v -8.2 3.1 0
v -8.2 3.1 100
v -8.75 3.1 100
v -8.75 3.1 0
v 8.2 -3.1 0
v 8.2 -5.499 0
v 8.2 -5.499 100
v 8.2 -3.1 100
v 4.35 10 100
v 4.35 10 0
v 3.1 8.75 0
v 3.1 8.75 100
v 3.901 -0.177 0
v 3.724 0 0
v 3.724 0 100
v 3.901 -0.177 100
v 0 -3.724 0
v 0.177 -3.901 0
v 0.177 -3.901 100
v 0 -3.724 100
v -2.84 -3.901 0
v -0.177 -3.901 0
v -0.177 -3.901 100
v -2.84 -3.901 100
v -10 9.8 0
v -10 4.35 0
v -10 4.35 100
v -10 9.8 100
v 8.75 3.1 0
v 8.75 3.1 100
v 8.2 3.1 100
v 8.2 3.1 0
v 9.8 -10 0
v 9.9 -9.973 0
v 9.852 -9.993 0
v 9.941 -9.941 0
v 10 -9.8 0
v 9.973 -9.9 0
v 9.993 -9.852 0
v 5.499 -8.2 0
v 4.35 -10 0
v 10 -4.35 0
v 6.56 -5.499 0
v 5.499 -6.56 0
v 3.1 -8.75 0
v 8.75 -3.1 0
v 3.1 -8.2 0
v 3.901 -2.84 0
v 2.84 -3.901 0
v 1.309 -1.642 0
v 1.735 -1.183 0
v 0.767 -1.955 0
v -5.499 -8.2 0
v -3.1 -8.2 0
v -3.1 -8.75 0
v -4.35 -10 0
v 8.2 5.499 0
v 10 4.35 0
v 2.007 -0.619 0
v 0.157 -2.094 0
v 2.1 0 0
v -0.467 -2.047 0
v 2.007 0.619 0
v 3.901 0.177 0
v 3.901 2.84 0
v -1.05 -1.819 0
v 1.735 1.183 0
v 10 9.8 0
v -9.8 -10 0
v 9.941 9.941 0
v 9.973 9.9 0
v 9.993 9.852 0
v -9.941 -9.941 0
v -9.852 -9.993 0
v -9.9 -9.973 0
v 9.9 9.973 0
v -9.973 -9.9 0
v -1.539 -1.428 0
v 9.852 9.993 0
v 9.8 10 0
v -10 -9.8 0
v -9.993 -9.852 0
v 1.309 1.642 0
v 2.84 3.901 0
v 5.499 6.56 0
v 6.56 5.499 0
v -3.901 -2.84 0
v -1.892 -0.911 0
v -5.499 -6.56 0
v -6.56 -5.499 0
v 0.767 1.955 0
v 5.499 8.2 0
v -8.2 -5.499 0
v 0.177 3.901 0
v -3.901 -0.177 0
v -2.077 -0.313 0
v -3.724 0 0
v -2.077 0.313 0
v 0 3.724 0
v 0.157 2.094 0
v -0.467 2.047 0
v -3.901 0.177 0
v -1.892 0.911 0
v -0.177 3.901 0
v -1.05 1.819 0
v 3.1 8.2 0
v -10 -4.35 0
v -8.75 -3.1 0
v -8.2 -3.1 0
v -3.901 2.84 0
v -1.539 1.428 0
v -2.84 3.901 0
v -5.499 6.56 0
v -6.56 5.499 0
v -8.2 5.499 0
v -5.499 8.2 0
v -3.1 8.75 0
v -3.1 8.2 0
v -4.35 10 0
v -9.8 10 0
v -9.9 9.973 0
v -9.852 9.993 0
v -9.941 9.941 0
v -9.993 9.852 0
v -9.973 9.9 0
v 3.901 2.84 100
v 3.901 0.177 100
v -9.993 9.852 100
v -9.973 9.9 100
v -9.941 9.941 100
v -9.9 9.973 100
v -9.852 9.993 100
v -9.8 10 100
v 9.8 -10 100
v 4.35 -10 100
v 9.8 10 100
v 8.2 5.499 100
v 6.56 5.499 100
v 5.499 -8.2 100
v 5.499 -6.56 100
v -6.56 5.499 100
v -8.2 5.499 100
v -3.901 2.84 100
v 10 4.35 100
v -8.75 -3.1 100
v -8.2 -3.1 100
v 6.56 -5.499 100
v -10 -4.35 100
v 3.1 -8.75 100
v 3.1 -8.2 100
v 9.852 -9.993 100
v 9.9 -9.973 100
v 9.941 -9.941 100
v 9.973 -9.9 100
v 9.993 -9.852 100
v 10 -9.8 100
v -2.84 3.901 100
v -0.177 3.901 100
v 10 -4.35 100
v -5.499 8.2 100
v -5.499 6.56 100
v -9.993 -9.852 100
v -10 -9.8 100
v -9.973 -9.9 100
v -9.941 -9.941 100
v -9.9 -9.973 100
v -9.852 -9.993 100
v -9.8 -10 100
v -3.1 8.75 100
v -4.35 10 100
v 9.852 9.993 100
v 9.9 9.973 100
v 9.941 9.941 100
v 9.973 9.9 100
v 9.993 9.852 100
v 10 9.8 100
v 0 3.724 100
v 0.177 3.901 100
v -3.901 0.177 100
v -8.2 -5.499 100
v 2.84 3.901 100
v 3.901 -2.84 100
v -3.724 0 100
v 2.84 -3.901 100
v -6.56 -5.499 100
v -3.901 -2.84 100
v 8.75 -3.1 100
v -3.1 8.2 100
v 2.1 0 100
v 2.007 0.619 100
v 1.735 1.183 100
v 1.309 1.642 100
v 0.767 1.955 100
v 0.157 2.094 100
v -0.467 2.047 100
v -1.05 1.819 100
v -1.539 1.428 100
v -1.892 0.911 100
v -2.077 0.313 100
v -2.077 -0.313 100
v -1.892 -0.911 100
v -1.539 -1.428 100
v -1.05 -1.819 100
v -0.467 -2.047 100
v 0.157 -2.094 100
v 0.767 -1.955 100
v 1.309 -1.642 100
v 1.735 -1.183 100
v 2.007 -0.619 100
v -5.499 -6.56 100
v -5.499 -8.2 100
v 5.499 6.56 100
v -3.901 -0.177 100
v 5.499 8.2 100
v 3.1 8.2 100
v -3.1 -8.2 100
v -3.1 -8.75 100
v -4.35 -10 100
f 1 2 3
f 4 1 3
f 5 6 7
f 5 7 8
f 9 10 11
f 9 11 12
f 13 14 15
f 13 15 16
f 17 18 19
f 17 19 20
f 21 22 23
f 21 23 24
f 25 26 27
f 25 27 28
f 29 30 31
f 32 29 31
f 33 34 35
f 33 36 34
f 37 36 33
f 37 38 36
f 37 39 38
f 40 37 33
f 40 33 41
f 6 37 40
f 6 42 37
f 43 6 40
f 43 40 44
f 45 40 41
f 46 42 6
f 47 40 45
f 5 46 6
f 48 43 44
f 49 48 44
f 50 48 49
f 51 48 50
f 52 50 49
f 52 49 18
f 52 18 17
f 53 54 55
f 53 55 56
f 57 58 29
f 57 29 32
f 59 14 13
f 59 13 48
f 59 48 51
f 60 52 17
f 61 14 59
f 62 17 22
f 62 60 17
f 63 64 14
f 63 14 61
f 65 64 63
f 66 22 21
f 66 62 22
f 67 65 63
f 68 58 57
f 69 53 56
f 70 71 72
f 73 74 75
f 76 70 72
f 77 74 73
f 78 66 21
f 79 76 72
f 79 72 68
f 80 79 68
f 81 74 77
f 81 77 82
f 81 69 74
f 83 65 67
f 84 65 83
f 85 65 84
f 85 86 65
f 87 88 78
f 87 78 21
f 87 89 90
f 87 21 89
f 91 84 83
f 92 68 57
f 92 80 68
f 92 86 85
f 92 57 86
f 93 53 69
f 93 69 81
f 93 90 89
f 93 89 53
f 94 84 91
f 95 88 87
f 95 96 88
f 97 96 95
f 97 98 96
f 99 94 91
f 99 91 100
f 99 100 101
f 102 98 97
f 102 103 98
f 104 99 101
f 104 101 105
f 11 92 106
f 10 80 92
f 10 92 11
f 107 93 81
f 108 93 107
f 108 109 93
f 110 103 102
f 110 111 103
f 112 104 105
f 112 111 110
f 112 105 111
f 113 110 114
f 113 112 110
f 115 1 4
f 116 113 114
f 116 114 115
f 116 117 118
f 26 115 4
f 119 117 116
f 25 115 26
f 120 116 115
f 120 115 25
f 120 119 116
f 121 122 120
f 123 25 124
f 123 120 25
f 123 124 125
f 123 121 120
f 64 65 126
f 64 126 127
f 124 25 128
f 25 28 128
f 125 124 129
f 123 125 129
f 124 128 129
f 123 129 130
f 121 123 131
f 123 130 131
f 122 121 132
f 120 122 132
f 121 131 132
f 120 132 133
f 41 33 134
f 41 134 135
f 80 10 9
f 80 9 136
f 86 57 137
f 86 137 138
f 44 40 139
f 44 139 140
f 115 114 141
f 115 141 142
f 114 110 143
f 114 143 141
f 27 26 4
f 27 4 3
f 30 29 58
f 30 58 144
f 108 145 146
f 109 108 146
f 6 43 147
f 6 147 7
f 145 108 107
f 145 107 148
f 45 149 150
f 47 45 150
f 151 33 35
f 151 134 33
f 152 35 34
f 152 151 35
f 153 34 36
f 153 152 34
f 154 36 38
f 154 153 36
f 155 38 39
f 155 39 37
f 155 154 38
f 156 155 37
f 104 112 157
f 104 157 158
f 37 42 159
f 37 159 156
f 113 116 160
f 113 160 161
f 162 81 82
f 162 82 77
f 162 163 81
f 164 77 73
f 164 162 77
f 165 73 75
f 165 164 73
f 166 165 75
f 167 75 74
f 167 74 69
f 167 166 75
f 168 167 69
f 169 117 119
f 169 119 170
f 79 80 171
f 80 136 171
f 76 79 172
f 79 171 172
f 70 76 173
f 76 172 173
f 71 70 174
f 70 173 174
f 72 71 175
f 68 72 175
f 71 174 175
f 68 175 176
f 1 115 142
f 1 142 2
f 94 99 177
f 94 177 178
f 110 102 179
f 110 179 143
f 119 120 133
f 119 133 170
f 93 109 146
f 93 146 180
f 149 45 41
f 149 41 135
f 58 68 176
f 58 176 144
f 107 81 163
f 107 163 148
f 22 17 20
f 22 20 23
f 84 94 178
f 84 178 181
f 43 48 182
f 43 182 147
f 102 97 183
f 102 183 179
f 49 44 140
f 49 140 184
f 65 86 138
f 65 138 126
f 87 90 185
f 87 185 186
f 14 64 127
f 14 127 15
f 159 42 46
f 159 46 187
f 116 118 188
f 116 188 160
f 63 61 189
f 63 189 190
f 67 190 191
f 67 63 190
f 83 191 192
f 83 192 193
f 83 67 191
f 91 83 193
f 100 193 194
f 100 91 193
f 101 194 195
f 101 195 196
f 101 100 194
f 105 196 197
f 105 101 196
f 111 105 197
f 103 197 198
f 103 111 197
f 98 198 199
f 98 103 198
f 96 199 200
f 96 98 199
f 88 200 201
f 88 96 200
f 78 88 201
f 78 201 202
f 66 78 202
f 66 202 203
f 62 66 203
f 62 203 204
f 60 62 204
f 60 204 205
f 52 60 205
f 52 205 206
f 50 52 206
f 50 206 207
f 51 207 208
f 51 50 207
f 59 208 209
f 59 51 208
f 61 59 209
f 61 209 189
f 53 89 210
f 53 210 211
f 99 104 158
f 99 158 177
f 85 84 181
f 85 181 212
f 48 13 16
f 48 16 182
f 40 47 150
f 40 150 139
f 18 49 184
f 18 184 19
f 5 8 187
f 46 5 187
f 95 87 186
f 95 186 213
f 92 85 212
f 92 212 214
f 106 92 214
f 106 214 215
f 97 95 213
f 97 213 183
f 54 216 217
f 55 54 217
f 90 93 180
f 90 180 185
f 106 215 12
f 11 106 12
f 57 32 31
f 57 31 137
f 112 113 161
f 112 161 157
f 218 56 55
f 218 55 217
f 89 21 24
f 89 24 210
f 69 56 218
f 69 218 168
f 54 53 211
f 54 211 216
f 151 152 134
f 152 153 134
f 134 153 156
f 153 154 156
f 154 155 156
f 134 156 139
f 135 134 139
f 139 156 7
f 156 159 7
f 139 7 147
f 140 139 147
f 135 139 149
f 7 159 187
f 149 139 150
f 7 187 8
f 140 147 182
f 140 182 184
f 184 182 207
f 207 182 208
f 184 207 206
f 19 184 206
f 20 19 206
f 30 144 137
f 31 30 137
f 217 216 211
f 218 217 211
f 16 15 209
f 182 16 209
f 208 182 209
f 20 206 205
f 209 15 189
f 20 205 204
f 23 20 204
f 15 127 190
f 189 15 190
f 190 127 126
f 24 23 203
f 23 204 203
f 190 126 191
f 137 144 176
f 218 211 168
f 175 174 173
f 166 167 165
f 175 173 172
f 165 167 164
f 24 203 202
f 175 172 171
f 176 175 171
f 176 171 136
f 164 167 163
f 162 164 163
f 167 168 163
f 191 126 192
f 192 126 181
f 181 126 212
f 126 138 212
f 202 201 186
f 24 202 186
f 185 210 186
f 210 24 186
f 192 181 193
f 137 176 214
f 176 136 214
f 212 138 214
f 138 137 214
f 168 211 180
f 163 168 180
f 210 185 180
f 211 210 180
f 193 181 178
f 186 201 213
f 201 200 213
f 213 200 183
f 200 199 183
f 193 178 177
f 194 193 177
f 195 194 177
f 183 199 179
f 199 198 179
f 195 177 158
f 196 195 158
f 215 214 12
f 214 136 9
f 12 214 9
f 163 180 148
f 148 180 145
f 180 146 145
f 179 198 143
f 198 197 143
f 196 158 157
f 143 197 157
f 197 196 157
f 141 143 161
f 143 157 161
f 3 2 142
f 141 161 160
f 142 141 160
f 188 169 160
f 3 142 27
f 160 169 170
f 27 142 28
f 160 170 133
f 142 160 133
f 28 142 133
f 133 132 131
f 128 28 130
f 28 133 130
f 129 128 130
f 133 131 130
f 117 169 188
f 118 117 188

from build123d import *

# Parameters (mm, degrees)
SKETCH_R        = 2.1
PAD_DEPTH       = 100
CHAMFER_1_ANGLE = 45
CHAMFER_1_SIZE  = 1.25
CHAMFER_2_ANGLE = 45
CHAMFER_2_SIZE  = 1.25
CHAMFER_3_ANGLE = 45
CHAMFER_3_SIZE  = 1.25
CHAMFER_4_ANGLE = 45
CHAMFER_4_SIZE  = 1.25
CHAMFER_5_ANGLE = 45
CHAMFER_5_SIZE  = 1.25
CHAMFER_6_ANGLE = 45
CHAMFER_6_SIZE  = 1.25
CHAMFER_7_ANGLE = 45
CHAMFER_7_SIZE  = 1.25
CHAMFER_8_ANGLE = 45
CHAMFER_8_SIZE  = 1.25
FILLET_R        = 0.2


with BuildPart() as part:
    # Sketch → Pad (new body)
    with BuildSketch(Plane.XY):
        Polygon((0, 3.723883), (0.176777, 3.90066), (2.84, 3.90066), (5.49934, 6.56), (5.49934, 8.2), (3.1, 8.2), (3.1, 10), (10, 10), (10, 3.1), (8.2, 3.1), (8.2, 5.49934), (6.56, 5.49934), (3.90066, 2.84), (3.90066, 0.176777), (3.723883, 0), (3.90066, -0.176777), (3.90066, -2.84), (6.56, -5.49934), (8.2, -5.49934), (8.2, -3.1), (10, -3.1), (10, -10), (3.1, -10), (3.1, -8.2), (5.49934, -8.2), (5.49934, -6.56), (2.84, -3.90066), (0.176777, -3.90066), (0, -3.723883), (-0.176777, -3.90066), (-2.84, -3.90066), (-5.49934, -6.56), (-5.49934, -8.2), (-3.1, -8.2), (-3.1, -10), (-10, -10), (-10, -3.1), (-8.2, -3.1), (-8.2, -5.49934), (-6.56, -5.49934), (-3.90066, -2.84), (-3.90066, -0.176777), (-3.723883, 0), (-3.90066, 0.176777), (-3.90066, 2.84), (-6.56, 5.49934), (-8.2, 5.49934), (-8.2, 3.1), (-10, 3.1), (-10, 10), (-3.1, 10), (-3.1, 8.2), (-5.49934, 8.2), (-5.49934, 6.56), (-2.84, 3.90066), (-0.176777, 3.90066), align=None)
        Circle(SKETCH_R, mode=Mode.SUBTRACT)
    extrude(amount=PAD_DEPTH)

    # Chamfer 1
    chamfer_1_edges = [part.edges().sort_by_distance(p)[0] for p in [
        (-3.1, 10, 50),
    ]]
    chamfer_1_side = part.faces().sort_by_distance((-6.55, 10, 50))[0]
    chamfer(chamfer_1_edges, length=CHAMFER_1_SIZE, angle=CHAMFER_1_ANGLE, reference=chamfer_1_side)

    # Chamfer 2
    chamfer_2_edges = [part.edges().sort_by_distance(p)[0] for p in [
        (3.1, 10, 50),
    ]]
    chamfer_2_side = part.faces().sort_by_distance((3.1, 9.1, 50))[0]
    chamfer(chamfer_2_edges, length=CHAMFER_2_SIZE, angle=CHAMFER_2_ANGLE, reference=chamfer_2_side)

    # Chamfer 3
    chamfer_3_edges = [part.edges().sort_by_distance(p)[0] for p in [
        (-10, 3.1, 50),
    ]]
    chamfer_3_side = part.faces().sort_by_distance((-9.1, 3.1, 50))[0]
    chamfer(chamfer_3_edges, length=CHAMFER_3_SIZE, angle=CHAMFER_3_ANGLE, reference=chamfer_3_side)

    # Chamfer 4
    chamfer_4_edges = [part.edges().sort_by_distance(p)[0] for p in [
        (3.1, -10, 50),
    ]]
    chamfer_4_side = part.faces().sort_by_distance((6.55, -10, 50))[0]
    chamfer(chamfer_4_edges, length=CHAMFER_4_SIZE, angle=CHAMFER_4_ANGLE, reference=chamfer_4_side)

    # Chamfer 5
    chamfer_5_edges = [part.edges().sort_by_distance(p)[0] for p in [
        (-3.1, -10, 50),
    ]]
    chamfer_5_side = part.faces().sort_by_distance((-3.1, -9.1, 50))[0]
    chamfer(chamfer_5_edges, length=CHAMFER_5_SIZE, angle=CHAMFER_5_ANGLE, reference=chamfer_5_side)

    # Chamfer 6
    chamfer_6_edges = [part.edges().sort_by_distance(p)[0] for p in [
        (10, 3.1, 50),
    ]]
    chamfer_6_side = part.faces().sort_by_distance((10, 6.55, 50))[0]
    chamfer(chamfer_6_edges, length=CHAMFER_6_SIZE, angle=CHAMFER_6_ANGLE, reference=chamfer_6_side)

    # Chamfer 7
    chamfer_7_edges = [part.edges().sort_by_distance(p)[0] for p in [
        (10, -3.1, 50),
    ]]
    chamfer_7_side = part.faces().sort_by_distance((9.1, -3.1, 50))[0]
    chamfer(chamfer_7_edges, length=CHAMFER_7_SIZE, angle=CHAMFER_7_ANGLE, reference=chamfer_7_side)

    # Chamfer 8
    chamfer_8_edges = [part.edges().sort_by_distance(p)[0] for p in [
        (-10, -3.1, 50),
    ]]
    chamfer_8_side = part.faces().sort_by_distance((-10, -6.55, 50))[0]
    chamfer(chamfer_8_edges, length=CHAMFER_8_SIZE, angle=CHAMFER_8_ANGLE, reference=chamfer_8_side)

    # Fillet
    fillet_edges = [part.edges().sort_by_distance(p)[0] for p in [
        (10, 10, 50),
        (-10, 10, 50),
        (-10, -10, 50),
        (10, -10, 50),
    ]]
    fillet(fillet_edges, radius=FILLET_R)


solid = part.part
